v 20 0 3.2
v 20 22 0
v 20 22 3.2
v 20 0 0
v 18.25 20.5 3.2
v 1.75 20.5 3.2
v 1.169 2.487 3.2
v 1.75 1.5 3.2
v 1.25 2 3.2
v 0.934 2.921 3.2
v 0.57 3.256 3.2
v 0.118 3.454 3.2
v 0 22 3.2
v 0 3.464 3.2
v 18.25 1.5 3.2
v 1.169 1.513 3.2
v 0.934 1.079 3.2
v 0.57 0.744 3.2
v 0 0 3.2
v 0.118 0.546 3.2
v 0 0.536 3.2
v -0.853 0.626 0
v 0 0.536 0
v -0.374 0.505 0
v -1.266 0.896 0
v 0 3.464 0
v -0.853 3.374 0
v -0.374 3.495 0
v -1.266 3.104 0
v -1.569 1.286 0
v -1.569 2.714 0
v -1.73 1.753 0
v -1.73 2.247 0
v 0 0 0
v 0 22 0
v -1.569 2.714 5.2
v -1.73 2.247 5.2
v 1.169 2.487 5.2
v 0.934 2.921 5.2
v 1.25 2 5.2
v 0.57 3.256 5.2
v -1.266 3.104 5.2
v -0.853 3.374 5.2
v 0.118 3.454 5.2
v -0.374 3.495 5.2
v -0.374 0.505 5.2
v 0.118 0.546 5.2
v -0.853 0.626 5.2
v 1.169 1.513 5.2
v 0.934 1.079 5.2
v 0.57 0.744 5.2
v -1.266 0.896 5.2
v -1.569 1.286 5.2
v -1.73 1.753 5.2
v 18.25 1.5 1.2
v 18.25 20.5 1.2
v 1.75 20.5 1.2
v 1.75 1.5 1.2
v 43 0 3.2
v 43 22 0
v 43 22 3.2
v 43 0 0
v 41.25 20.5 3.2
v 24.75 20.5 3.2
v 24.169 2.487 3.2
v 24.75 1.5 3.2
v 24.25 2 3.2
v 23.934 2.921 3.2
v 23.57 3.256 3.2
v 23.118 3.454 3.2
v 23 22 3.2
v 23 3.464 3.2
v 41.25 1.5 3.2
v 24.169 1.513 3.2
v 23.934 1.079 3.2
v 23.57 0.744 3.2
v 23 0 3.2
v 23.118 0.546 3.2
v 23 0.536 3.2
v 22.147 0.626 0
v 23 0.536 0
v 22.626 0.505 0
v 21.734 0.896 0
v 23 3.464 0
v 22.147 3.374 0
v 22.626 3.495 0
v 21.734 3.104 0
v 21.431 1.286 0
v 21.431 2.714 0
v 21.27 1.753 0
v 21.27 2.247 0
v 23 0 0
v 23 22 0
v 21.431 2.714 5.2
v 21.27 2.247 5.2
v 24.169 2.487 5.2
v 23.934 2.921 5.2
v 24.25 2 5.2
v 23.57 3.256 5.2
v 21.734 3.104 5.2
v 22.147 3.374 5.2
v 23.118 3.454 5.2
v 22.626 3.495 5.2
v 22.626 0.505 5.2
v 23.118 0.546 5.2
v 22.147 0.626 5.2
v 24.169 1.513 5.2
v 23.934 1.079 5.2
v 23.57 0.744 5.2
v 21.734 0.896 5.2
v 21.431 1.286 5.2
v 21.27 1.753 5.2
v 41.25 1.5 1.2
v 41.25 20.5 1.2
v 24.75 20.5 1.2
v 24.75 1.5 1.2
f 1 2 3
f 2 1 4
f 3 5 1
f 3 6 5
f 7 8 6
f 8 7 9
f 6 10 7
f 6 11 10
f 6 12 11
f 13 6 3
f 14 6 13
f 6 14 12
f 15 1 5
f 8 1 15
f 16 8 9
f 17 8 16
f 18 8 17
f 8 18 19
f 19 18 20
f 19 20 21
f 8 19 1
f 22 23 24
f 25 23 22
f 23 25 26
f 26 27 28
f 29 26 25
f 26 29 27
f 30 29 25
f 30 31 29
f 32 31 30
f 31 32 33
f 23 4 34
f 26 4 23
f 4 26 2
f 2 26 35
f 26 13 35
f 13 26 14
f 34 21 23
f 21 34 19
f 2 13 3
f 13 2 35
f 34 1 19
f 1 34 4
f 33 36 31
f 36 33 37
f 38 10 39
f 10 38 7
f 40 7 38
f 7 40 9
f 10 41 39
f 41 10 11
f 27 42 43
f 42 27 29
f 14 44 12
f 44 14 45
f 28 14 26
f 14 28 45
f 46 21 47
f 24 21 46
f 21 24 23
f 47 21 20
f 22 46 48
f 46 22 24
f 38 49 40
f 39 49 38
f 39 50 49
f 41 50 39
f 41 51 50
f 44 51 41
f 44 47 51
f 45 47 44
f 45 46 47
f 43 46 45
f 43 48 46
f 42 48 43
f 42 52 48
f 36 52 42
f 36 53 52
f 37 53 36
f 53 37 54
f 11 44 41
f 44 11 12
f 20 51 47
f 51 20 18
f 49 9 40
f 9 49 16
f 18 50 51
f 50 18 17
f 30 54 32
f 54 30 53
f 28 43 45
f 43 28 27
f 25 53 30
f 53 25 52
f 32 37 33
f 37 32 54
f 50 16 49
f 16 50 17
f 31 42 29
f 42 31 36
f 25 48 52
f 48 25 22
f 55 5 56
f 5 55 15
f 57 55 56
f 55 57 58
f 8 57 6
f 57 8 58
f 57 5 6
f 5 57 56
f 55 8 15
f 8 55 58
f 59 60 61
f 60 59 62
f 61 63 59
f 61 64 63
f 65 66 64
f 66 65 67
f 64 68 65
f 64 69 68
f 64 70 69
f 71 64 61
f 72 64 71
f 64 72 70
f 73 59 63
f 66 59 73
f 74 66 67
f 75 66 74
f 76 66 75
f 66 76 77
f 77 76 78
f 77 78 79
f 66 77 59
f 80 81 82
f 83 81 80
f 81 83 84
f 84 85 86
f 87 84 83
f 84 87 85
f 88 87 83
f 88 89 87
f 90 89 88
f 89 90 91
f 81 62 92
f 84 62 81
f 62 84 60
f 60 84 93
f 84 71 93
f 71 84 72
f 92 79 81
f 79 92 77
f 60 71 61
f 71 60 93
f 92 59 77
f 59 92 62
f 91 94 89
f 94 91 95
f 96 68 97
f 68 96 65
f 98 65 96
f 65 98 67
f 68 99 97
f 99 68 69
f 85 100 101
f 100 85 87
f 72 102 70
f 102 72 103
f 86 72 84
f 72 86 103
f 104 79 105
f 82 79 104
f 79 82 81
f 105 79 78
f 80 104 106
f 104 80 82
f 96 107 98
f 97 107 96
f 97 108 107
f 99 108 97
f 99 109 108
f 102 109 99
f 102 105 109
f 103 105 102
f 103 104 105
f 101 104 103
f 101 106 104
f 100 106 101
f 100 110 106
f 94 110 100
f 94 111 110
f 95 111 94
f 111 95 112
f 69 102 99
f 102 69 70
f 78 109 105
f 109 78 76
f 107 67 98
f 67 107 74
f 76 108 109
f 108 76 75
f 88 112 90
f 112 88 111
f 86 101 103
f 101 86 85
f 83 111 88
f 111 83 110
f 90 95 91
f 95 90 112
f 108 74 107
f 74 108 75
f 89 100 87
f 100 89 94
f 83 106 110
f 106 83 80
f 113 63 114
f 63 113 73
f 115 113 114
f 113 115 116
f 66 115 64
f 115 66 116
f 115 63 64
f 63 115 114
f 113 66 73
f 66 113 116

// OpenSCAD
// Hat for hoperf LoRa module when iot4pi is connected to smaller
// banana-pi to prevent short-circuit
//

module hoprf_hat
    (hi=2, ho=3.2, xi=16.5, yi=19, xo=20, yo=22, dx=2, dy=0.5, hr=1.5)
{
    difference () {
        union () {
            cube ([xo, yo, ho]);
            translate ([(xo-xi)/2-dx, (yo-yi)/2+dy, 0])
                cylinder (r=hr, h=hi+ho);
        }
        translate ([(xo-xi)/2, (yo-yi)/2, ho-hi])
            cube ([xi, yi, ho]);
    }
}

xo=20;
translate ([0, 0, 0])
    hoprf_hat (xo=xo, $fa = 3, $fs = 0.5);
translate ([xo+3, 0, 0])
    hoprf_hat (xo=xo, $fa = 3, $fs = 0.5);
